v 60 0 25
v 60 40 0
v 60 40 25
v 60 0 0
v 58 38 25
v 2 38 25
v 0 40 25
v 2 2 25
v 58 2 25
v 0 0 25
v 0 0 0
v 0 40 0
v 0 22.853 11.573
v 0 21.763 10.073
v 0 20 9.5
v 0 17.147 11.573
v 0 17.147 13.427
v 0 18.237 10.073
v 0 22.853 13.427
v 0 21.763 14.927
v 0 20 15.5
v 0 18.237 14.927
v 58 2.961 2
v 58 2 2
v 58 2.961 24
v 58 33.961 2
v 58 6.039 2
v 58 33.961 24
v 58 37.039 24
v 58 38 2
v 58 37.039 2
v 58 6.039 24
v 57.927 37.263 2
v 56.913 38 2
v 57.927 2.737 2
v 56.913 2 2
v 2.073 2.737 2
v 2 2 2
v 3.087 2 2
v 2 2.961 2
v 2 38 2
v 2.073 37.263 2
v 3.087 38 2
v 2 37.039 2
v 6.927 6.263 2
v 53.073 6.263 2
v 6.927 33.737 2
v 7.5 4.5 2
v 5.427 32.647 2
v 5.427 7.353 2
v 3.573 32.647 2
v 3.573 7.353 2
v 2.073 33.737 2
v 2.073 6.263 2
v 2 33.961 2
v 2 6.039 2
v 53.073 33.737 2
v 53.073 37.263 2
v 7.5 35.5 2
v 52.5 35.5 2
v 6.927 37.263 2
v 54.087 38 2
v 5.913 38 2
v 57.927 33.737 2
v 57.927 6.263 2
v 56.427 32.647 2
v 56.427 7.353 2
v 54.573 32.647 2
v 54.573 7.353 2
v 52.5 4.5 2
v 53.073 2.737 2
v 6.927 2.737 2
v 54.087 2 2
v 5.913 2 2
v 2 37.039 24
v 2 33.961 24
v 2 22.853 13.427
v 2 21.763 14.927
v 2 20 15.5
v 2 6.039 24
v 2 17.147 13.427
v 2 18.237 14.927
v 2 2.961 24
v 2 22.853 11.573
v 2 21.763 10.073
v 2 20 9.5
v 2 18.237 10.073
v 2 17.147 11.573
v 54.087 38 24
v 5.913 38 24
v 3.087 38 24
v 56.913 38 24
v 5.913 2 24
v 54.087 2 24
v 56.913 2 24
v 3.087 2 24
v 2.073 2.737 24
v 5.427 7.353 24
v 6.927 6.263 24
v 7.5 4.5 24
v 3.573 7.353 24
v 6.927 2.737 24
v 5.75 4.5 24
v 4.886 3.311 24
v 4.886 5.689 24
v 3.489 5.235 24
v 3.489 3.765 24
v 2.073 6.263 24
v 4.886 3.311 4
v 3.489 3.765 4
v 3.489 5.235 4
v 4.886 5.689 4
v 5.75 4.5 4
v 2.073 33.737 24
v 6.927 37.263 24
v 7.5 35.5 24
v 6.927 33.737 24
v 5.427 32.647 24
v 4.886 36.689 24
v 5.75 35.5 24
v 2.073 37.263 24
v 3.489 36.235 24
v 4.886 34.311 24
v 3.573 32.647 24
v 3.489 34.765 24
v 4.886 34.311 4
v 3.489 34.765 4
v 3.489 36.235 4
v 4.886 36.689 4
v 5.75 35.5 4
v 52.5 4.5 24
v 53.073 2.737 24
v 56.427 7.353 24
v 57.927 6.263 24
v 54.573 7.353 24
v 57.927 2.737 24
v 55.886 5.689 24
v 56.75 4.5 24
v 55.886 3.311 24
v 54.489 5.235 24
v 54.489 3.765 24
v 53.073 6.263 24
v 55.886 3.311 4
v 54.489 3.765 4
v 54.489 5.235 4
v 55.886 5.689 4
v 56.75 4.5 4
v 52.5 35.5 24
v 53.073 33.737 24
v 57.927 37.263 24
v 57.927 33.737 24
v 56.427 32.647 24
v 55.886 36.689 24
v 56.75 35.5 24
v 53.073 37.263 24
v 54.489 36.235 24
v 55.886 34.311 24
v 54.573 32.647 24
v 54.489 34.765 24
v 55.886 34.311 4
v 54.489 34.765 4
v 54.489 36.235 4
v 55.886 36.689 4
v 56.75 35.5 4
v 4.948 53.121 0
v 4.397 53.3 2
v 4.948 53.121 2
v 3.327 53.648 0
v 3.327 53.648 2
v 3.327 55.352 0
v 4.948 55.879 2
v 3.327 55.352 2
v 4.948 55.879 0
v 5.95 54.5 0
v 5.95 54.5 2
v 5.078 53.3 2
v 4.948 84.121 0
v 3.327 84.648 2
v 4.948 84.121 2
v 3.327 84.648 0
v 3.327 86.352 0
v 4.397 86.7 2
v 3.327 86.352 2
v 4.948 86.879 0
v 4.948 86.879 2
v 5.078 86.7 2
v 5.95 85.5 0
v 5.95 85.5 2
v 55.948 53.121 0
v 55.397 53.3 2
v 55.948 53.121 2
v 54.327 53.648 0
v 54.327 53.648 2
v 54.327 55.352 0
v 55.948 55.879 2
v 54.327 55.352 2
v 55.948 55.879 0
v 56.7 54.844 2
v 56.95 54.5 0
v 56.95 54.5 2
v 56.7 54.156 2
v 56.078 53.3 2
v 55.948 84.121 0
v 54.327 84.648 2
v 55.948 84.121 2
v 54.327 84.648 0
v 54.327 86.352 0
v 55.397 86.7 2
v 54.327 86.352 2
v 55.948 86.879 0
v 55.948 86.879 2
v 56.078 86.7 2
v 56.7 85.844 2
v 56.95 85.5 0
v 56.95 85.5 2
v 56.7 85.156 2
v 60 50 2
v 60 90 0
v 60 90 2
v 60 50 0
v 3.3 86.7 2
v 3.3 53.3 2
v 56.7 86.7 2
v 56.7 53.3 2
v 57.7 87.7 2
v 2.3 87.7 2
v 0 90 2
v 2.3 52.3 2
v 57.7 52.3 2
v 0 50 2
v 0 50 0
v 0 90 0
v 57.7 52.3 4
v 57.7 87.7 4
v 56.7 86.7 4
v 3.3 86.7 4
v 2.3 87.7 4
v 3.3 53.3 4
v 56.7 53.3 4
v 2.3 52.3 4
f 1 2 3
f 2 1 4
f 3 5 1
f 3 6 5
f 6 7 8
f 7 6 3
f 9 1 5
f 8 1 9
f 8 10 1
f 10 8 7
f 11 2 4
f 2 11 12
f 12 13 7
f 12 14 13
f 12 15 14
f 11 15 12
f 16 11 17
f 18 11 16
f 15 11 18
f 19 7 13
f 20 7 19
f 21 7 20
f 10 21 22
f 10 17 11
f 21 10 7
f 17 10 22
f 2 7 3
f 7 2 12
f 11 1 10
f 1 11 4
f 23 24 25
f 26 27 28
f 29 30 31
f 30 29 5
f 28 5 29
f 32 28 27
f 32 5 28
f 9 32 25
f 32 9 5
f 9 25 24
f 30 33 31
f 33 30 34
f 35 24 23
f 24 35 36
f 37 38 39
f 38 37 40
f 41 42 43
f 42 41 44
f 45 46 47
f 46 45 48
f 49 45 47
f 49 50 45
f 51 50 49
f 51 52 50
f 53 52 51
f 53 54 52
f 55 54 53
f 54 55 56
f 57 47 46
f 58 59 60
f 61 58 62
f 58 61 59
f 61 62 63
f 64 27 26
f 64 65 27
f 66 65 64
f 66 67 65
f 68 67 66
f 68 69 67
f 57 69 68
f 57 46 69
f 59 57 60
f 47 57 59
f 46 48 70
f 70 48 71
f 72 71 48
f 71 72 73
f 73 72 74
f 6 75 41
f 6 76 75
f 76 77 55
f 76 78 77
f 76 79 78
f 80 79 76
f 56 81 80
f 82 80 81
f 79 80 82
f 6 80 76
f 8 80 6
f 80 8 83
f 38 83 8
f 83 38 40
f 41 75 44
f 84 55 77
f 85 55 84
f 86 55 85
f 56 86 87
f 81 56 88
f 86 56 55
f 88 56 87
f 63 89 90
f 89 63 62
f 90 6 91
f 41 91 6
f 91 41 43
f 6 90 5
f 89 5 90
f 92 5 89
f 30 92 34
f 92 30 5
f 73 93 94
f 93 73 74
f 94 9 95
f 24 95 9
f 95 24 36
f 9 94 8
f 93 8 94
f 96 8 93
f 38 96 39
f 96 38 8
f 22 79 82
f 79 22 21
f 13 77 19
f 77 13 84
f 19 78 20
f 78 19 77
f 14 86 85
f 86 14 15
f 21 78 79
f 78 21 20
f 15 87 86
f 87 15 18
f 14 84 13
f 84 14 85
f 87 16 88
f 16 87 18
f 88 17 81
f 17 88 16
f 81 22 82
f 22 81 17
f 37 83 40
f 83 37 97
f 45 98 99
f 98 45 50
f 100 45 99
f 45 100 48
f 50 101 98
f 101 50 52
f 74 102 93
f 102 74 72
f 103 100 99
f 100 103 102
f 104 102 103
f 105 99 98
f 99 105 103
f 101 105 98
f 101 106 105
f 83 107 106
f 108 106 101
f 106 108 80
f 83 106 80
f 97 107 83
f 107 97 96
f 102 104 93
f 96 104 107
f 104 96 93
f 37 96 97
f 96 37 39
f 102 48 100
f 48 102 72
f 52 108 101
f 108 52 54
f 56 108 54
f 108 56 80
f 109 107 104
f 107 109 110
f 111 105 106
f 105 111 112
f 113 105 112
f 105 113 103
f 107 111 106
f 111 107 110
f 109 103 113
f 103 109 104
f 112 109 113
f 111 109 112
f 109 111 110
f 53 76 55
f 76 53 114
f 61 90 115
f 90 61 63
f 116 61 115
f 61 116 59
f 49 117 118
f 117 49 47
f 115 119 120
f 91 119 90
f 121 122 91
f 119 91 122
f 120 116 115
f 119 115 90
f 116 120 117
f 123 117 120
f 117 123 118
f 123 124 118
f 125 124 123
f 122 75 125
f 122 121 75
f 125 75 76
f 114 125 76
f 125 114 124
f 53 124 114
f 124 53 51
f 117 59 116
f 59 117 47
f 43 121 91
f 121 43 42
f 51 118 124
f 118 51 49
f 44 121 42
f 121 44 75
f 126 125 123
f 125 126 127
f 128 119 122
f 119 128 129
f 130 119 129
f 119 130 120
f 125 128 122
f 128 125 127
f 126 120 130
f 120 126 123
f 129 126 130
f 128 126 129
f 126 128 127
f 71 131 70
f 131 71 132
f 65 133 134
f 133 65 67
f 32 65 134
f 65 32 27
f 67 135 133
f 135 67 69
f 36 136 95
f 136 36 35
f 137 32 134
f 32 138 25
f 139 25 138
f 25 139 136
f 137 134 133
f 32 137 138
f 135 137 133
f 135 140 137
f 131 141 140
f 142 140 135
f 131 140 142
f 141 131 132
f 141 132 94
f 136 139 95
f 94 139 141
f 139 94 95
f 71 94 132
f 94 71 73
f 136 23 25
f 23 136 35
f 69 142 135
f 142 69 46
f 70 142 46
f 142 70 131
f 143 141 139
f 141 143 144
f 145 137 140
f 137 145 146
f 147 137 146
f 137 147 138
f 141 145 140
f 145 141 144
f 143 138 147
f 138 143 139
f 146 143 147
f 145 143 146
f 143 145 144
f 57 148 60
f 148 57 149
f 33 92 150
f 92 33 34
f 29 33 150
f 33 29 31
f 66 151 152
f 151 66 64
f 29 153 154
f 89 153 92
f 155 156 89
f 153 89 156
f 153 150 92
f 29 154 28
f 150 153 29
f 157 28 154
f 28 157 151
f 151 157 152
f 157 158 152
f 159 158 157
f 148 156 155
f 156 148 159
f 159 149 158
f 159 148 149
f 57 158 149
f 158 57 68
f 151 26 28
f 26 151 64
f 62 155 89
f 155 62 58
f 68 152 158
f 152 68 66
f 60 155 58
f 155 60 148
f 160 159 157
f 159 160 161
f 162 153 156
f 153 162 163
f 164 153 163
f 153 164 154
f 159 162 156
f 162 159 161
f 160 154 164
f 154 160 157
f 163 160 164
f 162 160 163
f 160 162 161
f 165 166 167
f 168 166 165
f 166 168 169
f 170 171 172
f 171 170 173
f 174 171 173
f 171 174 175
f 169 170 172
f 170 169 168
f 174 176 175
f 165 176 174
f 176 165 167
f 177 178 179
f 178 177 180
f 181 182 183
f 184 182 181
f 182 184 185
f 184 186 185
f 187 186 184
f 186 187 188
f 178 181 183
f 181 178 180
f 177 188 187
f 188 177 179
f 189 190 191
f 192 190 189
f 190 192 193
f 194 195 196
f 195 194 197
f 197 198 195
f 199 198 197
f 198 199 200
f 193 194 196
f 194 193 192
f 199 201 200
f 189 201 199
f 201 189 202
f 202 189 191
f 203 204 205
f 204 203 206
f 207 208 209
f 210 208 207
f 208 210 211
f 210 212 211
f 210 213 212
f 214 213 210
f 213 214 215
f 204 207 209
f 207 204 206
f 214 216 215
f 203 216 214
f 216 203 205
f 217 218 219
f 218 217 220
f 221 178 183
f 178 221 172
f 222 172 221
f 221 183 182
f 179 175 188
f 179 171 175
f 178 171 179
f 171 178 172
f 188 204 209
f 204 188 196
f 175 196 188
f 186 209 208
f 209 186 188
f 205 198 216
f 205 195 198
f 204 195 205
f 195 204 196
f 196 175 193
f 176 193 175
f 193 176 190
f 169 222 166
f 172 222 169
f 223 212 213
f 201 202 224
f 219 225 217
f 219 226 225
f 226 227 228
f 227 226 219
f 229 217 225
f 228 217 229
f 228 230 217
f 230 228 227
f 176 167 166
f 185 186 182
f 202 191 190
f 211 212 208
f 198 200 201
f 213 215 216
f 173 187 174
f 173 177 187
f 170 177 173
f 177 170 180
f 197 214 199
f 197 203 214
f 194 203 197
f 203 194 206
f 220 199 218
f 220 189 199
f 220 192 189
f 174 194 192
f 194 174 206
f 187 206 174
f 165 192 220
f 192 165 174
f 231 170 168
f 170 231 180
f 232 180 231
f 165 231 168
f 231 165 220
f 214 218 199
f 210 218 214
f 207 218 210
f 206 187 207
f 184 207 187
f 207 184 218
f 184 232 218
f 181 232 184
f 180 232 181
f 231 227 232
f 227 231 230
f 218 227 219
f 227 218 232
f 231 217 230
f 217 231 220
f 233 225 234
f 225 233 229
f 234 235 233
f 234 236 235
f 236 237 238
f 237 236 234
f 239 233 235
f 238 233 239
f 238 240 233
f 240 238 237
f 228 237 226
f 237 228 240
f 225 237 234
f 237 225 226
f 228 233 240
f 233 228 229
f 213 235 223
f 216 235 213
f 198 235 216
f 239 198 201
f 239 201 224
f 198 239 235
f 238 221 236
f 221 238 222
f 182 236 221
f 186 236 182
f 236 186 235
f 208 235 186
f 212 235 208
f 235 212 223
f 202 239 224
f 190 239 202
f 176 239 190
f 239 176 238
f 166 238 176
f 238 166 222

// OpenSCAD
// Purpose: electronics box with lid and four screw bosses; lid lies next to it, ready to print.
w = 60; d = 40; h = 25; t = 2;
dome_d = 6; screw_d = 2.5; inset = 4.5;   // Bosses overlap the wall (no touching point)

module domes(hh) {
    for (x = [inset, w - inset], y = [inset, d - inset])
        translate([x, y, 0]) difference() {
            cylinder(h = hh, d = dome_d);
            translate([0, 0, 2]) cylinder(h = hh, d = screw_d);
        }
}

module box() {
    difference() {
        cube([w, d, h]);
        translate([t, t, t]) cube([w - 2 * t, d - 2 * t, h]);
        // Cable entry
        translate([-1, d / 2, h / 2]) rotate([0, 90, 0]) cylinder(h = t + 2, d = 6);
    }
    translate([0, 0, t]) domes(h - t - 1);
}

module lid() {
    difference() {
        cube([w, d, t]);
        for (x = [inset, w - inset], y = [inset, d - inset])
            translate([x, y, -1]) cylinder(h = t + 2, d = screw_d + 0.4);
    }
    // Centring rim
    translate([t + 0.3, t + 0.3, t]) difference() {
        cube([w - 2 * t - 0.6, d - 2 * t - 0.6, 2]);
        translate([1, 1, -1]) cube([w - 2 * t - 2.6, d - 2 * t - 2.6, 4]);
    }
}

echo(inner = [w - 2 * t, d - 2 * t, h - t]);
box();
translate([0, d + 10, 0]) lid();
